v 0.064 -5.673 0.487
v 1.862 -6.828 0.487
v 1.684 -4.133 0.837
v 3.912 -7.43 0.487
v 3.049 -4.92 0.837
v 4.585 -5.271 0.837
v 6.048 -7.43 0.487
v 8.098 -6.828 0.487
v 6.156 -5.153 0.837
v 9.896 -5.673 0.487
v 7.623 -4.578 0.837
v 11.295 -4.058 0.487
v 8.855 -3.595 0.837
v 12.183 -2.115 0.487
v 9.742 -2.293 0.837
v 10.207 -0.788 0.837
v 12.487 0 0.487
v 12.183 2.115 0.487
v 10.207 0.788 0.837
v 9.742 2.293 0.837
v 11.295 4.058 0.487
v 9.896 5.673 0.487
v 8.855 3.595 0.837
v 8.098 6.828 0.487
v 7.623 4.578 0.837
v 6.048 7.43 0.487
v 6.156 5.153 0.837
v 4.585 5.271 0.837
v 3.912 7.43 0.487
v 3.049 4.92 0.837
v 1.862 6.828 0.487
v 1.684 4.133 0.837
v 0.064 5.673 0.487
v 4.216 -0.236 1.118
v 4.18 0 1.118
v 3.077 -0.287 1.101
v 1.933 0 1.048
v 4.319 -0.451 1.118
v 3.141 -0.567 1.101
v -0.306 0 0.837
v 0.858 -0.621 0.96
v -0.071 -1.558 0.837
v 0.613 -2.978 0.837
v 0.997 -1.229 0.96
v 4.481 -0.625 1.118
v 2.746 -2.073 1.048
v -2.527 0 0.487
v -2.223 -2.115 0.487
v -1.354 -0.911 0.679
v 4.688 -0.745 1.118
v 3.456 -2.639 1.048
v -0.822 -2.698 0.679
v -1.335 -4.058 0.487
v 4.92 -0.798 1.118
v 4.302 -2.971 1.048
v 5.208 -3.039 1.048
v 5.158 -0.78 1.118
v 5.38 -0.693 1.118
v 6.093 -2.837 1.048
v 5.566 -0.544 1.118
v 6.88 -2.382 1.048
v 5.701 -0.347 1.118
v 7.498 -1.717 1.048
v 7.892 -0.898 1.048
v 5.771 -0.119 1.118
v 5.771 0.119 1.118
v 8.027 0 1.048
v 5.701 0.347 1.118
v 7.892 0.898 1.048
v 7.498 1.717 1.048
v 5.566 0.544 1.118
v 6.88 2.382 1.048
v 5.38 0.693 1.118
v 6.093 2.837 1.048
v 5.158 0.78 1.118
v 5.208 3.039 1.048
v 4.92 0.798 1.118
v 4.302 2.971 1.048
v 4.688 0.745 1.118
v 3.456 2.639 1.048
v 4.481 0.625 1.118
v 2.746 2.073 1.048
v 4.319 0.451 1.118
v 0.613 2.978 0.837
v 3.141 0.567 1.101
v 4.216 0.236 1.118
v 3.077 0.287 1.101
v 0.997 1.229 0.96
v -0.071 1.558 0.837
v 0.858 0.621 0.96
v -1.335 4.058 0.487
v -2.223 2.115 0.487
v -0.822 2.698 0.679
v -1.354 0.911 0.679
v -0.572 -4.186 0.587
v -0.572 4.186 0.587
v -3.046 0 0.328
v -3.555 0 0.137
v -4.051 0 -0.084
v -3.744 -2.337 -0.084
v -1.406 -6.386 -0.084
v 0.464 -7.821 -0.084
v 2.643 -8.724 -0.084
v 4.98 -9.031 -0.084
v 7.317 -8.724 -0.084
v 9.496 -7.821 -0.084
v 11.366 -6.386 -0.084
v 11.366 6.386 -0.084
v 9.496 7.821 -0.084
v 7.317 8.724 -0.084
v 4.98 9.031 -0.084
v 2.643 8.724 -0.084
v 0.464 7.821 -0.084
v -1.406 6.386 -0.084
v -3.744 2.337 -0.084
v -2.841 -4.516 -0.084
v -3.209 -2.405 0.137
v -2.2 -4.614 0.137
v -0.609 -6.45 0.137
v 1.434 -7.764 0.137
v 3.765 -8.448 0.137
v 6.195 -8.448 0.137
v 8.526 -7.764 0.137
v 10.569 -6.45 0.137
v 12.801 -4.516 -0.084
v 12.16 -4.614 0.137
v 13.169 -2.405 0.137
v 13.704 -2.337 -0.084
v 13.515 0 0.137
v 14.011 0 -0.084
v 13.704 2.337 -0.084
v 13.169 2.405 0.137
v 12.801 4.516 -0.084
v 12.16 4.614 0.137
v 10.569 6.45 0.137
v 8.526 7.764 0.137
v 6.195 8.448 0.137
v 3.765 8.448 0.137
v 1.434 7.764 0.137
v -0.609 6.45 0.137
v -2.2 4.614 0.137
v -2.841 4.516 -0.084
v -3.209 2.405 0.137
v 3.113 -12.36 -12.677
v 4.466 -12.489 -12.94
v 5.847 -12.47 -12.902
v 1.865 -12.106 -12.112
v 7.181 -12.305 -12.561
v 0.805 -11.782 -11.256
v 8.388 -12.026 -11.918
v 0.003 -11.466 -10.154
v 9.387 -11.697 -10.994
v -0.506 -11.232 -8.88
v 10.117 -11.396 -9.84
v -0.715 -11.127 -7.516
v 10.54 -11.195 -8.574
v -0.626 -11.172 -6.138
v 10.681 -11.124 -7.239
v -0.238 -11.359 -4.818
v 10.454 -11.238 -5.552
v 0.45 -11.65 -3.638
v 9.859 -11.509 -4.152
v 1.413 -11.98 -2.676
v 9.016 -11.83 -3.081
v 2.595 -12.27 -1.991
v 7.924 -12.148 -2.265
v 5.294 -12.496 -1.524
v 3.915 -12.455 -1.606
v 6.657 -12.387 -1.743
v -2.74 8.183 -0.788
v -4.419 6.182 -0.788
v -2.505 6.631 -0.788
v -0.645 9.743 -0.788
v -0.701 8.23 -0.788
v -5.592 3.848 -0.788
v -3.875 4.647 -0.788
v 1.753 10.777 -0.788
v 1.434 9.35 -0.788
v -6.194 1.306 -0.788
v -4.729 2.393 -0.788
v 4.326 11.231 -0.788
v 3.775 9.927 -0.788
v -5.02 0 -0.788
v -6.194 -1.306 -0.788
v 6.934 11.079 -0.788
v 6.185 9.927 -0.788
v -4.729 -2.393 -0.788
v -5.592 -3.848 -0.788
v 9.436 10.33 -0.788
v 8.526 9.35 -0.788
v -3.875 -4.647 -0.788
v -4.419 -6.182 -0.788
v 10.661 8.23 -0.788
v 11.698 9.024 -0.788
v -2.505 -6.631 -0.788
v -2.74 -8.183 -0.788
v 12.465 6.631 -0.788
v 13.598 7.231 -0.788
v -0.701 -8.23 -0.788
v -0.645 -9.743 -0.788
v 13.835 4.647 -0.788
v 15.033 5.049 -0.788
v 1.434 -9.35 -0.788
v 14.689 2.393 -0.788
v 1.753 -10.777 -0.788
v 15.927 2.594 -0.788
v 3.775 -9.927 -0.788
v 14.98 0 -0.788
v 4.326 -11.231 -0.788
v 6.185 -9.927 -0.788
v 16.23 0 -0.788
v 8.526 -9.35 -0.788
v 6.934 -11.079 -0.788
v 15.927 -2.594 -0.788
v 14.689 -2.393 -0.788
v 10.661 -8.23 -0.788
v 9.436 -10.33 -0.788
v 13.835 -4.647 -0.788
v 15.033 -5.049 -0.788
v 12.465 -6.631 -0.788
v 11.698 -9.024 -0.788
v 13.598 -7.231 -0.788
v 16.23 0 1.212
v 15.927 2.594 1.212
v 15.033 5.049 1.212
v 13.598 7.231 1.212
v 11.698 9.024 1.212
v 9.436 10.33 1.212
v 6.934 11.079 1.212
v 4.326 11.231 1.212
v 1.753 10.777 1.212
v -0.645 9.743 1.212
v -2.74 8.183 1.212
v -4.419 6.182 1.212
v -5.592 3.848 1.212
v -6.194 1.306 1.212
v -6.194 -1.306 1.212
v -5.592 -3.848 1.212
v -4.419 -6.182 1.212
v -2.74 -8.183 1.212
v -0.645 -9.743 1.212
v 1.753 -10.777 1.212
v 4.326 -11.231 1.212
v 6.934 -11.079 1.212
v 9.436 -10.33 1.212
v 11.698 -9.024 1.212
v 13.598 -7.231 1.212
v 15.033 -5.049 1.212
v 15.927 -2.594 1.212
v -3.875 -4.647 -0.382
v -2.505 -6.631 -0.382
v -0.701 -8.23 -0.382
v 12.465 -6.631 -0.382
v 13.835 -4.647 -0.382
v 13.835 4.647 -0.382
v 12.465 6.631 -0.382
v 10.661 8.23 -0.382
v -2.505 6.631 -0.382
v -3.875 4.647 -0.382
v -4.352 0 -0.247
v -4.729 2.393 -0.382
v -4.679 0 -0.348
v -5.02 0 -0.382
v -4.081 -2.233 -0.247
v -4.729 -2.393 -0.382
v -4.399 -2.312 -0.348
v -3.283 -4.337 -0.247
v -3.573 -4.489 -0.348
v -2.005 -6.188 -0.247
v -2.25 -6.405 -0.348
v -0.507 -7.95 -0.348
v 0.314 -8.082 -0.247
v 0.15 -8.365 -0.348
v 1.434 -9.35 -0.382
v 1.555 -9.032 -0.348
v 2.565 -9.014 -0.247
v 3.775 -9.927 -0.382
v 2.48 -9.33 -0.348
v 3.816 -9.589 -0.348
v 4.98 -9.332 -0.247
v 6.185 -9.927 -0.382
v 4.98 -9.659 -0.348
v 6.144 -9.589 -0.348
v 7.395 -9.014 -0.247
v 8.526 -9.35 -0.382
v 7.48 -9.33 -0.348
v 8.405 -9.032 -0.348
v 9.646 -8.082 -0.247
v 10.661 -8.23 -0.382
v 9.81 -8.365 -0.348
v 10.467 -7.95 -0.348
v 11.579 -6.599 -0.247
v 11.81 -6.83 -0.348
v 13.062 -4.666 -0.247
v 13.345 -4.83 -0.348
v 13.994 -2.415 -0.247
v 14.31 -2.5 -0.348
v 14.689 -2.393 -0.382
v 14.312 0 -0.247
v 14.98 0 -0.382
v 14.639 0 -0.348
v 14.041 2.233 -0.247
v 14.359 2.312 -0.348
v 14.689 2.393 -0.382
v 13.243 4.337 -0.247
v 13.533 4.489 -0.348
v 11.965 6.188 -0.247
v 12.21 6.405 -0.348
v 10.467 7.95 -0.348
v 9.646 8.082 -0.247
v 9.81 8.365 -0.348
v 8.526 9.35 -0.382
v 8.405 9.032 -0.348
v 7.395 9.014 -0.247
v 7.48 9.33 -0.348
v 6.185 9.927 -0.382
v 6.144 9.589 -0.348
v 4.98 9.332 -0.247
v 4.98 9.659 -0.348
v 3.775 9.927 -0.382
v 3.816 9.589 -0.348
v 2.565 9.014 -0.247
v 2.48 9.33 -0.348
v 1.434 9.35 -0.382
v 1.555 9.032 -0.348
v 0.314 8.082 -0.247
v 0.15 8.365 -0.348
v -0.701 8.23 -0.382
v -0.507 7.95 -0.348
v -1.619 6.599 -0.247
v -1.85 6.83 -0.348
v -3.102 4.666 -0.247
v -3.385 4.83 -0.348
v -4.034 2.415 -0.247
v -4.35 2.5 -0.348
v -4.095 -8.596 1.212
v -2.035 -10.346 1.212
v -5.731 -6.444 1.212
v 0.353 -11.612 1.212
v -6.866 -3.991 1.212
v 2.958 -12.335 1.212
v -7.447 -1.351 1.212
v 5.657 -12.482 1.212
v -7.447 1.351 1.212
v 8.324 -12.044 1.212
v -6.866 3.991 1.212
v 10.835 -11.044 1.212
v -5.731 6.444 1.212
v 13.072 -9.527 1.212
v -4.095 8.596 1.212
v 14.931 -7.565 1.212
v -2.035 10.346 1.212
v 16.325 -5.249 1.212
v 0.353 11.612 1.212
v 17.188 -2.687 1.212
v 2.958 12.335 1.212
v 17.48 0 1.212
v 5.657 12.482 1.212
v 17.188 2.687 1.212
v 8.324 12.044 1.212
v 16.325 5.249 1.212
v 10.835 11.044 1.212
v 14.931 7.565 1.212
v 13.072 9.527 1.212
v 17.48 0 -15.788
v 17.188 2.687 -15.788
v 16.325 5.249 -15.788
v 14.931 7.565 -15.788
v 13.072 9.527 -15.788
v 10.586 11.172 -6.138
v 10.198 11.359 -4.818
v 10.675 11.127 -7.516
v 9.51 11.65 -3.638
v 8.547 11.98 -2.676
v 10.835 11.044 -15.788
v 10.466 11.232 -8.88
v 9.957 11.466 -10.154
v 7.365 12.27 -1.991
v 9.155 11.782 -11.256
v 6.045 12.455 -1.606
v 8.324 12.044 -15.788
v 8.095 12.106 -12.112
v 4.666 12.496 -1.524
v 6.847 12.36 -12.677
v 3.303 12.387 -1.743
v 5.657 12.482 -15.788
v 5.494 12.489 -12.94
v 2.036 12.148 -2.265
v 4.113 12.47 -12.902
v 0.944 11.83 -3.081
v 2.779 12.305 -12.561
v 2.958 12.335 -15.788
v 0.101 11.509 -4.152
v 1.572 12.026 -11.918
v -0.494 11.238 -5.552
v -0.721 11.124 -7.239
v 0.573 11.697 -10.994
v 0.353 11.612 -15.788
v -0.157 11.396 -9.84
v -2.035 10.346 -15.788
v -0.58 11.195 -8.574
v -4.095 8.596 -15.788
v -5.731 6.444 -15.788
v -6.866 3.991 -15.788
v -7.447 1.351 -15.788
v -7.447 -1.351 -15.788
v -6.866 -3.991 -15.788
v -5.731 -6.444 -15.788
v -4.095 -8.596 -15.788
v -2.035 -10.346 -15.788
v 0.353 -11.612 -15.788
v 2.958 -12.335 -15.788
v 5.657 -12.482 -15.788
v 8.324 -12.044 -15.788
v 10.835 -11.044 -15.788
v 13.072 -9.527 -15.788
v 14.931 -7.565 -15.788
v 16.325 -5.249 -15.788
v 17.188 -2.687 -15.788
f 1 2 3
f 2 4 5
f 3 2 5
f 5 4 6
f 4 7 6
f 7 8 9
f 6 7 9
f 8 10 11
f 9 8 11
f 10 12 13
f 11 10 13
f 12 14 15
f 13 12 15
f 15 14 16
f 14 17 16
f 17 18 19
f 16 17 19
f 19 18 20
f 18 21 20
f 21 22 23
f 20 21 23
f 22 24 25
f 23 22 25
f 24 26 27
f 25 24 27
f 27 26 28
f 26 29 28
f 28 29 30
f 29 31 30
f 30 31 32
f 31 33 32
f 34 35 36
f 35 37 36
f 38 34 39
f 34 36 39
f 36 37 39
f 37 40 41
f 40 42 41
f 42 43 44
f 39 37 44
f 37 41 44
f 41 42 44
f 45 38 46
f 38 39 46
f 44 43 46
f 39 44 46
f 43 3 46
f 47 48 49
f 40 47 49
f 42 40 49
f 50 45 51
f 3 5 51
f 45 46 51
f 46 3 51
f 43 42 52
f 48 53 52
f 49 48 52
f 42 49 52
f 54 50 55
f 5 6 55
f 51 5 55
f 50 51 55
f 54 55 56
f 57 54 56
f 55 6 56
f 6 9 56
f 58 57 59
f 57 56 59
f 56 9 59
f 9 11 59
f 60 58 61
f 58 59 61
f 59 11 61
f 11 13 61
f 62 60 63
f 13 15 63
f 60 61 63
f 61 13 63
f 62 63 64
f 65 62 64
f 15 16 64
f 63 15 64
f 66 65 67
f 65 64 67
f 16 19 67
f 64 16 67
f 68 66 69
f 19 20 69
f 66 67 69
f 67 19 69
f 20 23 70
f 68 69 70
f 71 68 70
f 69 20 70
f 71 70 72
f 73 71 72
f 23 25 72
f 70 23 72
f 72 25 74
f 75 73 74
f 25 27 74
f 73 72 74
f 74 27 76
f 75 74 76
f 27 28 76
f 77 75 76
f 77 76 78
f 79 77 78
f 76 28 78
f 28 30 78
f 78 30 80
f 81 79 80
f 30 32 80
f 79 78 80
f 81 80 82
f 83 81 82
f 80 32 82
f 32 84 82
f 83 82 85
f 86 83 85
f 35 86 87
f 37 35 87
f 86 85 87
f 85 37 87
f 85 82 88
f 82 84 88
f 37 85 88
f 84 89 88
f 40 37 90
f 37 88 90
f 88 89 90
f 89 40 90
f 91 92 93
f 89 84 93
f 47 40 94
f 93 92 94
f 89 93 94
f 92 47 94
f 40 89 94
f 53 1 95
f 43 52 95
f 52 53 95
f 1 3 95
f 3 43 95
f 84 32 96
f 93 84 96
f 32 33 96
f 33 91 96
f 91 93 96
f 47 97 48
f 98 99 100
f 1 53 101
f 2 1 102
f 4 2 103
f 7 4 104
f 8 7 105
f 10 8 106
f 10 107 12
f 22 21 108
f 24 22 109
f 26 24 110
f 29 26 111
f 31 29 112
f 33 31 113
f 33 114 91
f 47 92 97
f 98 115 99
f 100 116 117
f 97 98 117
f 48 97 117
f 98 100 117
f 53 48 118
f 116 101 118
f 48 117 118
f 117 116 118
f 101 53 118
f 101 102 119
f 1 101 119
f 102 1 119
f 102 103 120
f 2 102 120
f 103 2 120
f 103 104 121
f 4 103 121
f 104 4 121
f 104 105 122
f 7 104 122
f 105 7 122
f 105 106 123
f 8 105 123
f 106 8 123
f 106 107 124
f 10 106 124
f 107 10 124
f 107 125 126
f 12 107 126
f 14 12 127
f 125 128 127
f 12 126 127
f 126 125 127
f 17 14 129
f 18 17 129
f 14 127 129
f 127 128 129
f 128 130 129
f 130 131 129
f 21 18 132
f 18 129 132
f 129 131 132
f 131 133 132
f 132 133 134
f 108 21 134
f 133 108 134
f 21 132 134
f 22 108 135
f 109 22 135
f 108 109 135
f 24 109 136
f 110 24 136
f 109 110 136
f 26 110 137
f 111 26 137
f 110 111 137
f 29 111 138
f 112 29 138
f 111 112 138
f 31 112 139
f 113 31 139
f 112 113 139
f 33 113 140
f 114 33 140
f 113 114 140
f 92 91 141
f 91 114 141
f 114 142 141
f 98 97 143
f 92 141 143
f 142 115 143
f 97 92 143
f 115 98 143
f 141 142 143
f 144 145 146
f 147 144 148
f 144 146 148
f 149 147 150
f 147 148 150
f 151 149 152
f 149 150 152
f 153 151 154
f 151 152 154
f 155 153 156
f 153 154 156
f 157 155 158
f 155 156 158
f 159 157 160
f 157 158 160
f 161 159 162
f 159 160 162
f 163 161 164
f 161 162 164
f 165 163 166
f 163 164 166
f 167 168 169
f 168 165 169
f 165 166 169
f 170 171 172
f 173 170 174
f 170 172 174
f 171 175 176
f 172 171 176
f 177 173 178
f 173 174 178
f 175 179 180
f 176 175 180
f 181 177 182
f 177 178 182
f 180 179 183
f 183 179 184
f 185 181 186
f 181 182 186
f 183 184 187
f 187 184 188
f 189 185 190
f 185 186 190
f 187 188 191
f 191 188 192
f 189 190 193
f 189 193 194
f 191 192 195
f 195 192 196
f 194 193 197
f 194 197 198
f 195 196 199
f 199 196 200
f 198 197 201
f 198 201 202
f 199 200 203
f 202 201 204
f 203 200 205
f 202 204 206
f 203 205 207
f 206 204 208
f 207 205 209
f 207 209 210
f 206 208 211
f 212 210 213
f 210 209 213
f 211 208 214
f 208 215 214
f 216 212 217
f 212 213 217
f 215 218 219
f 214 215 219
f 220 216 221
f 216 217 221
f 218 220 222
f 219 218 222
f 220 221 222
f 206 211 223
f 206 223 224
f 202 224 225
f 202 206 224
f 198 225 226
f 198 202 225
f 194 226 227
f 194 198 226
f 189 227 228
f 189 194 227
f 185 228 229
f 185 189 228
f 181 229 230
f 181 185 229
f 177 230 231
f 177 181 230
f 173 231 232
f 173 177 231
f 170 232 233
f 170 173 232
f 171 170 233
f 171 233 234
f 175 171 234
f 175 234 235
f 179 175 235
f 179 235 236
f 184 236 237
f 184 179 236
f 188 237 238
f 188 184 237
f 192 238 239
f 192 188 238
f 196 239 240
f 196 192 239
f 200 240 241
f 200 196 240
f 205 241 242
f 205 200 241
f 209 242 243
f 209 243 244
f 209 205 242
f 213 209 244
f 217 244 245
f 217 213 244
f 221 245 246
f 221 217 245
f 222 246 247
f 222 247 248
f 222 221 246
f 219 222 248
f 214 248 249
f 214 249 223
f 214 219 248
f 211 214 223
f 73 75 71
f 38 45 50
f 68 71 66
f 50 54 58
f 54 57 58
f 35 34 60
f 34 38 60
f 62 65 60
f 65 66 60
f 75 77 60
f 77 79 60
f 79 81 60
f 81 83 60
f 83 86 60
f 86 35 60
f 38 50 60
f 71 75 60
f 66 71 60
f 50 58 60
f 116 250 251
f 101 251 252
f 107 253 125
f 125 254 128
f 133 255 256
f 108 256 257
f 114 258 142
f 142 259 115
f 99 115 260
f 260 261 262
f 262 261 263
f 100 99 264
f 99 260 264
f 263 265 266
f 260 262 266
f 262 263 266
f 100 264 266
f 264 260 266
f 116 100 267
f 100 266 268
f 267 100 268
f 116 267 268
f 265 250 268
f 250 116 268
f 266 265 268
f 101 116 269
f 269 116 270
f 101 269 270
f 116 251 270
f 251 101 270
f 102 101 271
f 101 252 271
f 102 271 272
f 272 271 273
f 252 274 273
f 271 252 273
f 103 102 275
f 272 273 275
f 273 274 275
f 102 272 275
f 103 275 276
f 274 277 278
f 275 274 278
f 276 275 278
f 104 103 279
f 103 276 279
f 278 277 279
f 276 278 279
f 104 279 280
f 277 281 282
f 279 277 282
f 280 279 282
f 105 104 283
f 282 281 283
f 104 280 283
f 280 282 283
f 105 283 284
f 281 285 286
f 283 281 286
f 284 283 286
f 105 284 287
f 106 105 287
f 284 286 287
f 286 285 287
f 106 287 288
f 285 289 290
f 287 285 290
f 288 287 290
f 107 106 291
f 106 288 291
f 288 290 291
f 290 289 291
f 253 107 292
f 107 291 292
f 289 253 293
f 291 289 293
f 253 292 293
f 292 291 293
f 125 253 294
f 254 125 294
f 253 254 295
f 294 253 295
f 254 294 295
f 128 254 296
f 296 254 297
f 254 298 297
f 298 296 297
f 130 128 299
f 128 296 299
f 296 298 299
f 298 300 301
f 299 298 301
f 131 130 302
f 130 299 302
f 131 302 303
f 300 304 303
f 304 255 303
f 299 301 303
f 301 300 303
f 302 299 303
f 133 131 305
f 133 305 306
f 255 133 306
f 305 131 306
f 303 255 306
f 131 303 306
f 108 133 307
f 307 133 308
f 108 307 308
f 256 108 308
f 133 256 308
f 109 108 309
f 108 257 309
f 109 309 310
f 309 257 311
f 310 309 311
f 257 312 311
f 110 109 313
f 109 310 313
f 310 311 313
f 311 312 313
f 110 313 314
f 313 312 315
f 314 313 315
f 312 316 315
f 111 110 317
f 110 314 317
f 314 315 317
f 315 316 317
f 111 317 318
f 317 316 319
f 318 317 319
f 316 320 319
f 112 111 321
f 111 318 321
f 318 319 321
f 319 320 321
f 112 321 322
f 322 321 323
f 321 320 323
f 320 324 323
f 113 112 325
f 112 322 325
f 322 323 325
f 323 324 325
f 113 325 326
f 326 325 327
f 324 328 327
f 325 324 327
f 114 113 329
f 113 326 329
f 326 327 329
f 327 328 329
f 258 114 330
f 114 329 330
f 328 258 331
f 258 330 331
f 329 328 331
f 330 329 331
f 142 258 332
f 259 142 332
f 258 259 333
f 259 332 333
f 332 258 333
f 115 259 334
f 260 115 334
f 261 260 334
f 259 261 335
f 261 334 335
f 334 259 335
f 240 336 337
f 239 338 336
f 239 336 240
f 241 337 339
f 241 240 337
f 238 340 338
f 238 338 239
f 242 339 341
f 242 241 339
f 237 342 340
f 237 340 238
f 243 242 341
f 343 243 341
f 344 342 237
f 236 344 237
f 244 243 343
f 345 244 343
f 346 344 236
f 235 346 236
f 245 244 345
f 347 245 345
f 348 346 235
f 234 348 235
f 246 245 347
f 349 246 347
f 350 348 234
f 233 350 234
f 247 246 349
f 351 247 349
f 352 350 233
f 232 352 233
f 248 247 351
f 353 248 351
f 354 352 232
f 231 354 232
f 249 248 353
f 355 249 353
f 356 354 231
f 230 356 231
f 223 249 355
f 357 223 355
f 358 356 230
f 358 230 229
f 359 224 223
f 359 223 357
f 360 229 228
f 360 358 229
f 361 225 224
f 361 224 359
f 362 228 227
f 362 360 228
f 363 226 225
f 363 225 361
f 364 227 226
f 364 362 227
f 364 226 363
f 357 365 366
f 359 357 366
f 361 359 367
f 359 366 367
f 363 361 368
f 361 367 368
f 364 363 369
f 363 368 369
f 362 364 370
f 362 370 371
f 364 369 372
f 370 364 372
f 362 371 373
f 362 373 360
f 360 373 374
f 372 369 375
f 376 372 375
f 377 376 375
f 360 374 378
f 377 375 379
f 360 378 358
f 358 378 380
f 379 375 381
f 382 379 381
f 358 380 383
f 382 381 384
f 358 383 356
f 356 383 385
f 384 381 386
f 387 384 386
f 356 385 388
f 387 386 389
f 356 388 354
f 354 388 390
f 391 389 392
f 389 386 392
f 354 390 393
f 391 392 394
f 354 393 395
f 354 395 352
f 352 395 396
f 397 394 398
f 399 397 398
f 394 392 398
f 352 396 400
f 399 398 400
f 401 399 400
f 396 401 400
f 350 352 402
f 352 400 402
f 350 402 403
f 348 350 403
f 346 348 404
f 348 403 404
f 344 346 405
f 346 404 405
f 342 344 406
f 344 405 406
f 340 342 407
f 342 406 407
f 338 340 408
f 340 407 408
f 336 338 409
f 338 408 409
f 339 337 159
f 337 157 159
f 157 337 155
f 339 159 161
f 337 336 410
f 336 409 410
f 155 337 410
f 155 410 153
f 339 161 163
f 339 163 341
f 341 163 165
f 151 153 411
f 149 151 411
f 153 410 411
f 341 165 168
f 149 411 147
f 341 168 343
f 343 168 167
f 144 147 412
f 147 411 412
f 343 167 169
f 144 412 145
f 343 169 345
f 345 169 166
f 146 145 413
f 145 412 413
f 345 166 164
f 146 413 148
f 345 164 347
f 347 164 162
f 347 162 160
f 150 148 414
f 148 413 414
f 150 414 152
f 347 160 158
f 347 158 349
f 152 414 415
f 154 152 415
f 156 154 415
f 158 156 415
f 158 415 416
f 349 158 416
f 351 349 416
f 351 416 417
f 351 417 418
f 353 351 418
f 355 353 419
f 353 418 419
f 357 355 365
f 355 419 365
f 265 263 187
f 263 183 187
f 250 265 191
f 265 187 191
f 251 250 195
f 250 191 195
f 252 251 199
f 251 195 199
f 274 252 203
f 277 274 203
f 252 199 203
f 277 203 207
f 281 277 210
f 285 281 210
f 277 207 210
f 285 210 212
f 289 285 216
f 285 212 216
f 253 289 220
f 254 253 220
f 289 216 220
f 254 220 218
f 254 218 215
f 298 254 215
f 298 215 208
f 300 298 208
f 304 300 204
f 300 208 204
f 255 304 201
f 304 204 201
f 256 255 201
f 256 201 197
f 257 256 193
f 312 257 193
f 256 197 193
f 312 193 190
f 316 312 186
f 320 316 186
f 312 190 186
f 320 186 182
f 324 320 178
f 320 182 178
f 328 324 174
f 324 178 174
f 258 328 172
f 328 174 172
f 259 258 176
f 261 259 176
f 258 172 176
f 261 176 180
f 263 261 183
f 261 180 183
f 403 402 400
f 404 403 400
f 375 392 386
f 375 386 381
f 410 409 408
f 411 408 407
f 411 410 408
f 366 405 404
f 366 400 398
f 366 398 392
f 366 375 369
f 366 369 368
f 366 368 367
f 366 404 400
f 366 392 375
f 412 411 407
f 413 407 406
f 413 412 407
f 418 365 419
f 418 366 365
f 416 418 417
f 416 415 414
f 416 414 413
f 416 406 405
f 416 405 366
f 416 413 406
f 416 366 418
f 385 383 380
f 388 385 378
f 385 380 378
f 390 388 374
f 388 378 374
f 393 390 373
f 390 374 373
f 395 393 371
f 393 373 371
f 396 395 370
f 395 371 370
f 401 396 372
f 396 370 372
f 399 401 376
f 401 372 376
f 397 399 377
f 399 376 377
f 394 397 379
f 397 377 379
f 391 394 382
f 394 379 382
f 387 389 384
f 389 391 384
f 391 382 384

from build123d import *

# Parameters (mm, degrees)
F2_R     = 12.5
F2_R_2   = 10
F3_DEPTH = 15
F4_R     = 12.5
F4_R_2   = 11.25
F5_DEPTH = 2
F8_DEPTH = 50


with BuildPart() as f1:
    # F0 (on Front) → F1 (revolve)
    with BuildSketch(Plane.XZ):
        with BuildLine():
            Line((4.9800029832, -0.7875902065), (4.9800029832, -0.3815757062))
            Line((4.9800029832, -0.3815757062), (4.9800029832, 1.1184242938))
            Line((4.9800029832, 1.1184242938), (4.1800029832, 1.1184242938))
            ThreePointArc((4.1800029832, 1.1184242938), (0.8118554552, 0.9601863869), (-2.5266210559, 0.4868666314))
            ThreePointArc((-2.5266210559, 0.4868666314), (-3.3020091302, 0.2364900314), (-4.0513253894, -0.083572855))
            ThreePointArc((-4.0513253894, -0.083572855), (-4.5132598016, -0.3053910404), (-5.0199970168, -0.3815757062))
            Line((-5.0199970168, -0.3815757062), (-5.0199970168, -0.7875902065))
            Line((-5.0199970168, -0.7875902065), (4.9800029832, -0.7875902065))
        make_face()
    revolve(axis=Axis((4.9800029832, 0, 0.3684242938), (0, 0, 1)))

    # F2 (on face) → F3 (join)
    with BuildSketch(Plane(origin=(0, 0, -0.7875902065), x_dir=(1, 0, 0), z_dir=(0, 0, -1))):
        with Locations((4.9800029832, 0)):
            Circle(F2_R)
        with Locations((4.9800029832, 0)):
            Circle(F2_R_2, mode=Mode.SUBTRACT)
        with Locations((4.9800029832, 0)):
            Circle(F2_R_2)
    extrude(amount=F3_DEPTH)

    # F4 (on face) → F5 (join)
    with BuildSketch(Plane.XY.offset(-0.7875902065)):
        with Locations((4.9800029832, 0)):
            Circle(F4_R)
        with Locations((4.9800029832, 0)):
            Circle(F4_R_2, mode=Mode.SUBTRACT)
    extrude(amount=F5_DEPTH)

    # F7 (on offset) → F8 (cut)
    with BuildSketch(Plane.YZ.offset(17.3)):
        with BuildLine():
            Line((-13.25, -0.238639344), (-13.25, -14.238639344))
            ThreePointArc((-13.25, -14.238639344), (-11.1241774834, -7.238639344), (-13.25, -0.238639344))
        make_face()
        with BuildLine():
            ThreePointArc((13.25, -0.238639344), (11.1241774834, -7.238639344), (13.25, -14.238639344))
            Line((13.25, -14.238639344), (13.25, -0.238639344))
        make_face()
    extrude(amount=-F8_DEPTH, mode=Mode.SUBTRACT)


solid = f1.part
